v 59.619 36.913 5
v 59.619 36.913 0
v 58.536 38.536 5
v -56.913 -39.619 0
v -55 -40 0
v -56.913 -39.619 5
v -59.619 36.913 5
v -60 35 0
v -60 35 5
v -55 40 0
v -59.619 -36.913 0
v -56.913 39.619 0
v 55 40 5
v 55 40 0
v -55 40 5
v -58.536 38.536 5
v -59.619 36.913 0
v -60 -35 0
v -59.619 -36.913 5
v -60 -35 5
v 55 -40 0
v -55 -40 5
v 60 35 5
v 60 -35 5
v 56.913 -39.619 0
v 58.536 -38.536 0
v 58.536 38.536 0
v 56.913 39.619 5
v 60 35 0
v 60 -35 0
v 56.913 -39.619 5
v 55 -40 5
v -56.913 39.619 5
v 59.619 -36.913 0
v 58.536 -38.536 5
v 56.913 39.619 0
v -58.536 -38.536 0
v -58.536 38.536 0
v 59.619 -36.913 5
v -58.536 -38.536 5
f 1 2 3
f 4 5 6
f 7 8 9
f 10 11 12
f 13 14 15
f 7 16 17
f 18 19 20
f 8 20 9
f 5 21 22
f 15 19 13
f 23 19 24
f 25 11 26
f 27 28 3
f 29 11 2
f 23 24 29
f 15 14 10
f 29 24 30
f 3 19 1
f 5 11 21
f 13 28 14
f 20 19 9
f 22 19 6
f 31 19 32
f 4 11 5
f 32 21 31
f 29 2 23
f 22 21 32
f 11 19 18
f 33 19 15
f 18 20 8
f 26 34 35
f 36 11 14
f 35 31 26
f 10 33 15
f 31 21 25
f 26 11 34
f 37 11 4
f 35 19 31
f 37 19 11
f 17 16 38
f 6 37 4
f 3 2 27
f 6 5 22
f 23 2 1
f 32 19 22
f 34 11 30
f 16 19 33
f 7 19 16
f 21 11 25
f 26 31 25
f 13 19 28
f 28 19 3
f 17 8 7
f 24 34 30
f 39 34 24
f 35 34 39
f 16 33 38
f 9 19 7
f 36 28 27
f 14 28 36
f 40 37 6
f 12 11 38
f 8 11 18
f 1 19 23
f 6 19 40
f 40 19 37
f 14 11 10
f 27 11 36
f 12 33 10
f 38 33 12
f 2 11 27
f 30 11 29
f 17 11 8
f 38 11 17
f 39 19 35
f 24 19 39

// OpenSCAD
/*
 * Library:     RoundedPlate.scad
 * Version:     1.0
 * Author:      Reinhard Loch
 * Copyright:   2024
 * License:     2-clause BSD License
 *              (http://opensource.org/licenses/BSD-2-Clause)
 */


/* [Plate Dimensions] */

// Height
h = 5; // [10:200]

// Width
w = 120; // [10:250]

// Depth
d = 80; // [10:250]

// Radius
r = 5; // [1:10]


module RoundedPlate(h = h, w = w, d = d, r = r ) {

translate([-w/2 + r, -d/2 + r, 0])

    minkowski() {
        cube([w - 2*r, d - 2*r, h/2]);
        cylinder(h = h/2, r = r);
    };
    
};

RoundedPlate();
